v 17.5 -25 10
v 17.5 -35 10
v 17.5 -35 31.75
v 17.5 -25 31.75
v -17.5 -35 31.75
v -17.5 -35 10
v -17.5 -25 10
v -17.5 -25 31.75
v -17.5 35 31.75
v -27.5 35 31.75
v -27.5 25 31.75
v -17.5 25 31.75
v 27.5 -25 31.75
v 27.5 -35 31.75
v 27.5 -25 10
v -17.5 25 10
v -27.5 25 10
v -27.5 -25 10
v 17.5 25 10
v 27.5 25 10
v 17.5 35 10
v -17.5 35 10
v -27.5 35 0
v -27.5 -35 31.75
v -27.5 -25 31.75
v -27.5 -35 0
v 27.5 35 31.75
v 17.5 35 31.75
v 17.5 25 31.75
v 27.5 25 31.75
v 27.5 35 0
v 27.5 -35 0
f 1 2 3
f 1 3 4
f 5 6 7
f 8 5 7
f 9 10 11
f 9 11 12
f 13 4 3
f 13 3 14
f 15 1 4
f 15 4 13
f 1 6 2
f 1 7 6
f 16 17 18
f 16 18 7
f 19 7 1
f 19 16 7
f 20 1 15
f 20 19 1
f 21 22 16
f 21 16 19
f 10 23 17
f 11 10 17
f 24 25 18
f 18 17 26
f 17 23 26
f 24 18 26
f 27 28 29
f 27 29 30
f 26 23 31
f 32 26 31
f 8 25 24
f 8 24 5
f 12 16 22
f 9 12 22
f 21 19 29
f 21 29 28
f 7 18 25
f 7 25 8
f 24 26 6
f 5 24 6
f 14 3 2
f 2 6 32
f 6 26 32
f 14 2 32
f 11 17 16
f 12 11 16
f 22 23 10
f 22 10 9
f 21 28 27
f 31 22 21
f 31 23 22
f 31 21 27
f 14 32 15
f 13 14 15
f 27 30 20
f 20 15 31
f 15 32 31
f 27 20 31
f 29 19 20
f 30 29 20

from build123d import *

# Parameters (mm, degrees)
F1_DEPTH = 10
F0_W     = 10
F0_H     = 10
F2_DEPTH = 31.75


with BuildPart() as f1:
    # F0 (on Top) → F1 (new body)
    with BuildSketch(Plane.XY):
        Polygon((-17.5, -35), (0, -35), (0, 0), (-27.5, 0), (-27.5, -25), (-17.5, -25), align=None)
        Polygon((-27.5, 0), (0, 0), (0, 35), (-17.5, 35), (-17.5, 25), (-27.5, 25), align=None)
        Polygon((0, 0), (27.5, 0), (27.5, 25), (17.5, 25), (17.5, 35), (0, 35), align=None)
        Polygon((0, -35), (17.5, -35), (17.5, -25), (27.5, -25), (27.5, 0), (0, 0), align=None)
    extrude(amount=F1_DEPTH)

    # F0 (on Top) → F2 (join)
    with BuildSketch(Plane.XY):
        with Locations((22.5, 30)):
            Rectangle(F0_W, F0_H)
        with Locations((-22.5, 30)):
            Rectangle(F0_W, F0_H)
        with Locations((-22.5, -30)):
            Rectangle(F0_W, F0_H)
        with Locations((22.5, -30)):
            Rectangle(F0_W, F0_H)
    extrude(amount=F2_DEPTH)


solid = f1.part
